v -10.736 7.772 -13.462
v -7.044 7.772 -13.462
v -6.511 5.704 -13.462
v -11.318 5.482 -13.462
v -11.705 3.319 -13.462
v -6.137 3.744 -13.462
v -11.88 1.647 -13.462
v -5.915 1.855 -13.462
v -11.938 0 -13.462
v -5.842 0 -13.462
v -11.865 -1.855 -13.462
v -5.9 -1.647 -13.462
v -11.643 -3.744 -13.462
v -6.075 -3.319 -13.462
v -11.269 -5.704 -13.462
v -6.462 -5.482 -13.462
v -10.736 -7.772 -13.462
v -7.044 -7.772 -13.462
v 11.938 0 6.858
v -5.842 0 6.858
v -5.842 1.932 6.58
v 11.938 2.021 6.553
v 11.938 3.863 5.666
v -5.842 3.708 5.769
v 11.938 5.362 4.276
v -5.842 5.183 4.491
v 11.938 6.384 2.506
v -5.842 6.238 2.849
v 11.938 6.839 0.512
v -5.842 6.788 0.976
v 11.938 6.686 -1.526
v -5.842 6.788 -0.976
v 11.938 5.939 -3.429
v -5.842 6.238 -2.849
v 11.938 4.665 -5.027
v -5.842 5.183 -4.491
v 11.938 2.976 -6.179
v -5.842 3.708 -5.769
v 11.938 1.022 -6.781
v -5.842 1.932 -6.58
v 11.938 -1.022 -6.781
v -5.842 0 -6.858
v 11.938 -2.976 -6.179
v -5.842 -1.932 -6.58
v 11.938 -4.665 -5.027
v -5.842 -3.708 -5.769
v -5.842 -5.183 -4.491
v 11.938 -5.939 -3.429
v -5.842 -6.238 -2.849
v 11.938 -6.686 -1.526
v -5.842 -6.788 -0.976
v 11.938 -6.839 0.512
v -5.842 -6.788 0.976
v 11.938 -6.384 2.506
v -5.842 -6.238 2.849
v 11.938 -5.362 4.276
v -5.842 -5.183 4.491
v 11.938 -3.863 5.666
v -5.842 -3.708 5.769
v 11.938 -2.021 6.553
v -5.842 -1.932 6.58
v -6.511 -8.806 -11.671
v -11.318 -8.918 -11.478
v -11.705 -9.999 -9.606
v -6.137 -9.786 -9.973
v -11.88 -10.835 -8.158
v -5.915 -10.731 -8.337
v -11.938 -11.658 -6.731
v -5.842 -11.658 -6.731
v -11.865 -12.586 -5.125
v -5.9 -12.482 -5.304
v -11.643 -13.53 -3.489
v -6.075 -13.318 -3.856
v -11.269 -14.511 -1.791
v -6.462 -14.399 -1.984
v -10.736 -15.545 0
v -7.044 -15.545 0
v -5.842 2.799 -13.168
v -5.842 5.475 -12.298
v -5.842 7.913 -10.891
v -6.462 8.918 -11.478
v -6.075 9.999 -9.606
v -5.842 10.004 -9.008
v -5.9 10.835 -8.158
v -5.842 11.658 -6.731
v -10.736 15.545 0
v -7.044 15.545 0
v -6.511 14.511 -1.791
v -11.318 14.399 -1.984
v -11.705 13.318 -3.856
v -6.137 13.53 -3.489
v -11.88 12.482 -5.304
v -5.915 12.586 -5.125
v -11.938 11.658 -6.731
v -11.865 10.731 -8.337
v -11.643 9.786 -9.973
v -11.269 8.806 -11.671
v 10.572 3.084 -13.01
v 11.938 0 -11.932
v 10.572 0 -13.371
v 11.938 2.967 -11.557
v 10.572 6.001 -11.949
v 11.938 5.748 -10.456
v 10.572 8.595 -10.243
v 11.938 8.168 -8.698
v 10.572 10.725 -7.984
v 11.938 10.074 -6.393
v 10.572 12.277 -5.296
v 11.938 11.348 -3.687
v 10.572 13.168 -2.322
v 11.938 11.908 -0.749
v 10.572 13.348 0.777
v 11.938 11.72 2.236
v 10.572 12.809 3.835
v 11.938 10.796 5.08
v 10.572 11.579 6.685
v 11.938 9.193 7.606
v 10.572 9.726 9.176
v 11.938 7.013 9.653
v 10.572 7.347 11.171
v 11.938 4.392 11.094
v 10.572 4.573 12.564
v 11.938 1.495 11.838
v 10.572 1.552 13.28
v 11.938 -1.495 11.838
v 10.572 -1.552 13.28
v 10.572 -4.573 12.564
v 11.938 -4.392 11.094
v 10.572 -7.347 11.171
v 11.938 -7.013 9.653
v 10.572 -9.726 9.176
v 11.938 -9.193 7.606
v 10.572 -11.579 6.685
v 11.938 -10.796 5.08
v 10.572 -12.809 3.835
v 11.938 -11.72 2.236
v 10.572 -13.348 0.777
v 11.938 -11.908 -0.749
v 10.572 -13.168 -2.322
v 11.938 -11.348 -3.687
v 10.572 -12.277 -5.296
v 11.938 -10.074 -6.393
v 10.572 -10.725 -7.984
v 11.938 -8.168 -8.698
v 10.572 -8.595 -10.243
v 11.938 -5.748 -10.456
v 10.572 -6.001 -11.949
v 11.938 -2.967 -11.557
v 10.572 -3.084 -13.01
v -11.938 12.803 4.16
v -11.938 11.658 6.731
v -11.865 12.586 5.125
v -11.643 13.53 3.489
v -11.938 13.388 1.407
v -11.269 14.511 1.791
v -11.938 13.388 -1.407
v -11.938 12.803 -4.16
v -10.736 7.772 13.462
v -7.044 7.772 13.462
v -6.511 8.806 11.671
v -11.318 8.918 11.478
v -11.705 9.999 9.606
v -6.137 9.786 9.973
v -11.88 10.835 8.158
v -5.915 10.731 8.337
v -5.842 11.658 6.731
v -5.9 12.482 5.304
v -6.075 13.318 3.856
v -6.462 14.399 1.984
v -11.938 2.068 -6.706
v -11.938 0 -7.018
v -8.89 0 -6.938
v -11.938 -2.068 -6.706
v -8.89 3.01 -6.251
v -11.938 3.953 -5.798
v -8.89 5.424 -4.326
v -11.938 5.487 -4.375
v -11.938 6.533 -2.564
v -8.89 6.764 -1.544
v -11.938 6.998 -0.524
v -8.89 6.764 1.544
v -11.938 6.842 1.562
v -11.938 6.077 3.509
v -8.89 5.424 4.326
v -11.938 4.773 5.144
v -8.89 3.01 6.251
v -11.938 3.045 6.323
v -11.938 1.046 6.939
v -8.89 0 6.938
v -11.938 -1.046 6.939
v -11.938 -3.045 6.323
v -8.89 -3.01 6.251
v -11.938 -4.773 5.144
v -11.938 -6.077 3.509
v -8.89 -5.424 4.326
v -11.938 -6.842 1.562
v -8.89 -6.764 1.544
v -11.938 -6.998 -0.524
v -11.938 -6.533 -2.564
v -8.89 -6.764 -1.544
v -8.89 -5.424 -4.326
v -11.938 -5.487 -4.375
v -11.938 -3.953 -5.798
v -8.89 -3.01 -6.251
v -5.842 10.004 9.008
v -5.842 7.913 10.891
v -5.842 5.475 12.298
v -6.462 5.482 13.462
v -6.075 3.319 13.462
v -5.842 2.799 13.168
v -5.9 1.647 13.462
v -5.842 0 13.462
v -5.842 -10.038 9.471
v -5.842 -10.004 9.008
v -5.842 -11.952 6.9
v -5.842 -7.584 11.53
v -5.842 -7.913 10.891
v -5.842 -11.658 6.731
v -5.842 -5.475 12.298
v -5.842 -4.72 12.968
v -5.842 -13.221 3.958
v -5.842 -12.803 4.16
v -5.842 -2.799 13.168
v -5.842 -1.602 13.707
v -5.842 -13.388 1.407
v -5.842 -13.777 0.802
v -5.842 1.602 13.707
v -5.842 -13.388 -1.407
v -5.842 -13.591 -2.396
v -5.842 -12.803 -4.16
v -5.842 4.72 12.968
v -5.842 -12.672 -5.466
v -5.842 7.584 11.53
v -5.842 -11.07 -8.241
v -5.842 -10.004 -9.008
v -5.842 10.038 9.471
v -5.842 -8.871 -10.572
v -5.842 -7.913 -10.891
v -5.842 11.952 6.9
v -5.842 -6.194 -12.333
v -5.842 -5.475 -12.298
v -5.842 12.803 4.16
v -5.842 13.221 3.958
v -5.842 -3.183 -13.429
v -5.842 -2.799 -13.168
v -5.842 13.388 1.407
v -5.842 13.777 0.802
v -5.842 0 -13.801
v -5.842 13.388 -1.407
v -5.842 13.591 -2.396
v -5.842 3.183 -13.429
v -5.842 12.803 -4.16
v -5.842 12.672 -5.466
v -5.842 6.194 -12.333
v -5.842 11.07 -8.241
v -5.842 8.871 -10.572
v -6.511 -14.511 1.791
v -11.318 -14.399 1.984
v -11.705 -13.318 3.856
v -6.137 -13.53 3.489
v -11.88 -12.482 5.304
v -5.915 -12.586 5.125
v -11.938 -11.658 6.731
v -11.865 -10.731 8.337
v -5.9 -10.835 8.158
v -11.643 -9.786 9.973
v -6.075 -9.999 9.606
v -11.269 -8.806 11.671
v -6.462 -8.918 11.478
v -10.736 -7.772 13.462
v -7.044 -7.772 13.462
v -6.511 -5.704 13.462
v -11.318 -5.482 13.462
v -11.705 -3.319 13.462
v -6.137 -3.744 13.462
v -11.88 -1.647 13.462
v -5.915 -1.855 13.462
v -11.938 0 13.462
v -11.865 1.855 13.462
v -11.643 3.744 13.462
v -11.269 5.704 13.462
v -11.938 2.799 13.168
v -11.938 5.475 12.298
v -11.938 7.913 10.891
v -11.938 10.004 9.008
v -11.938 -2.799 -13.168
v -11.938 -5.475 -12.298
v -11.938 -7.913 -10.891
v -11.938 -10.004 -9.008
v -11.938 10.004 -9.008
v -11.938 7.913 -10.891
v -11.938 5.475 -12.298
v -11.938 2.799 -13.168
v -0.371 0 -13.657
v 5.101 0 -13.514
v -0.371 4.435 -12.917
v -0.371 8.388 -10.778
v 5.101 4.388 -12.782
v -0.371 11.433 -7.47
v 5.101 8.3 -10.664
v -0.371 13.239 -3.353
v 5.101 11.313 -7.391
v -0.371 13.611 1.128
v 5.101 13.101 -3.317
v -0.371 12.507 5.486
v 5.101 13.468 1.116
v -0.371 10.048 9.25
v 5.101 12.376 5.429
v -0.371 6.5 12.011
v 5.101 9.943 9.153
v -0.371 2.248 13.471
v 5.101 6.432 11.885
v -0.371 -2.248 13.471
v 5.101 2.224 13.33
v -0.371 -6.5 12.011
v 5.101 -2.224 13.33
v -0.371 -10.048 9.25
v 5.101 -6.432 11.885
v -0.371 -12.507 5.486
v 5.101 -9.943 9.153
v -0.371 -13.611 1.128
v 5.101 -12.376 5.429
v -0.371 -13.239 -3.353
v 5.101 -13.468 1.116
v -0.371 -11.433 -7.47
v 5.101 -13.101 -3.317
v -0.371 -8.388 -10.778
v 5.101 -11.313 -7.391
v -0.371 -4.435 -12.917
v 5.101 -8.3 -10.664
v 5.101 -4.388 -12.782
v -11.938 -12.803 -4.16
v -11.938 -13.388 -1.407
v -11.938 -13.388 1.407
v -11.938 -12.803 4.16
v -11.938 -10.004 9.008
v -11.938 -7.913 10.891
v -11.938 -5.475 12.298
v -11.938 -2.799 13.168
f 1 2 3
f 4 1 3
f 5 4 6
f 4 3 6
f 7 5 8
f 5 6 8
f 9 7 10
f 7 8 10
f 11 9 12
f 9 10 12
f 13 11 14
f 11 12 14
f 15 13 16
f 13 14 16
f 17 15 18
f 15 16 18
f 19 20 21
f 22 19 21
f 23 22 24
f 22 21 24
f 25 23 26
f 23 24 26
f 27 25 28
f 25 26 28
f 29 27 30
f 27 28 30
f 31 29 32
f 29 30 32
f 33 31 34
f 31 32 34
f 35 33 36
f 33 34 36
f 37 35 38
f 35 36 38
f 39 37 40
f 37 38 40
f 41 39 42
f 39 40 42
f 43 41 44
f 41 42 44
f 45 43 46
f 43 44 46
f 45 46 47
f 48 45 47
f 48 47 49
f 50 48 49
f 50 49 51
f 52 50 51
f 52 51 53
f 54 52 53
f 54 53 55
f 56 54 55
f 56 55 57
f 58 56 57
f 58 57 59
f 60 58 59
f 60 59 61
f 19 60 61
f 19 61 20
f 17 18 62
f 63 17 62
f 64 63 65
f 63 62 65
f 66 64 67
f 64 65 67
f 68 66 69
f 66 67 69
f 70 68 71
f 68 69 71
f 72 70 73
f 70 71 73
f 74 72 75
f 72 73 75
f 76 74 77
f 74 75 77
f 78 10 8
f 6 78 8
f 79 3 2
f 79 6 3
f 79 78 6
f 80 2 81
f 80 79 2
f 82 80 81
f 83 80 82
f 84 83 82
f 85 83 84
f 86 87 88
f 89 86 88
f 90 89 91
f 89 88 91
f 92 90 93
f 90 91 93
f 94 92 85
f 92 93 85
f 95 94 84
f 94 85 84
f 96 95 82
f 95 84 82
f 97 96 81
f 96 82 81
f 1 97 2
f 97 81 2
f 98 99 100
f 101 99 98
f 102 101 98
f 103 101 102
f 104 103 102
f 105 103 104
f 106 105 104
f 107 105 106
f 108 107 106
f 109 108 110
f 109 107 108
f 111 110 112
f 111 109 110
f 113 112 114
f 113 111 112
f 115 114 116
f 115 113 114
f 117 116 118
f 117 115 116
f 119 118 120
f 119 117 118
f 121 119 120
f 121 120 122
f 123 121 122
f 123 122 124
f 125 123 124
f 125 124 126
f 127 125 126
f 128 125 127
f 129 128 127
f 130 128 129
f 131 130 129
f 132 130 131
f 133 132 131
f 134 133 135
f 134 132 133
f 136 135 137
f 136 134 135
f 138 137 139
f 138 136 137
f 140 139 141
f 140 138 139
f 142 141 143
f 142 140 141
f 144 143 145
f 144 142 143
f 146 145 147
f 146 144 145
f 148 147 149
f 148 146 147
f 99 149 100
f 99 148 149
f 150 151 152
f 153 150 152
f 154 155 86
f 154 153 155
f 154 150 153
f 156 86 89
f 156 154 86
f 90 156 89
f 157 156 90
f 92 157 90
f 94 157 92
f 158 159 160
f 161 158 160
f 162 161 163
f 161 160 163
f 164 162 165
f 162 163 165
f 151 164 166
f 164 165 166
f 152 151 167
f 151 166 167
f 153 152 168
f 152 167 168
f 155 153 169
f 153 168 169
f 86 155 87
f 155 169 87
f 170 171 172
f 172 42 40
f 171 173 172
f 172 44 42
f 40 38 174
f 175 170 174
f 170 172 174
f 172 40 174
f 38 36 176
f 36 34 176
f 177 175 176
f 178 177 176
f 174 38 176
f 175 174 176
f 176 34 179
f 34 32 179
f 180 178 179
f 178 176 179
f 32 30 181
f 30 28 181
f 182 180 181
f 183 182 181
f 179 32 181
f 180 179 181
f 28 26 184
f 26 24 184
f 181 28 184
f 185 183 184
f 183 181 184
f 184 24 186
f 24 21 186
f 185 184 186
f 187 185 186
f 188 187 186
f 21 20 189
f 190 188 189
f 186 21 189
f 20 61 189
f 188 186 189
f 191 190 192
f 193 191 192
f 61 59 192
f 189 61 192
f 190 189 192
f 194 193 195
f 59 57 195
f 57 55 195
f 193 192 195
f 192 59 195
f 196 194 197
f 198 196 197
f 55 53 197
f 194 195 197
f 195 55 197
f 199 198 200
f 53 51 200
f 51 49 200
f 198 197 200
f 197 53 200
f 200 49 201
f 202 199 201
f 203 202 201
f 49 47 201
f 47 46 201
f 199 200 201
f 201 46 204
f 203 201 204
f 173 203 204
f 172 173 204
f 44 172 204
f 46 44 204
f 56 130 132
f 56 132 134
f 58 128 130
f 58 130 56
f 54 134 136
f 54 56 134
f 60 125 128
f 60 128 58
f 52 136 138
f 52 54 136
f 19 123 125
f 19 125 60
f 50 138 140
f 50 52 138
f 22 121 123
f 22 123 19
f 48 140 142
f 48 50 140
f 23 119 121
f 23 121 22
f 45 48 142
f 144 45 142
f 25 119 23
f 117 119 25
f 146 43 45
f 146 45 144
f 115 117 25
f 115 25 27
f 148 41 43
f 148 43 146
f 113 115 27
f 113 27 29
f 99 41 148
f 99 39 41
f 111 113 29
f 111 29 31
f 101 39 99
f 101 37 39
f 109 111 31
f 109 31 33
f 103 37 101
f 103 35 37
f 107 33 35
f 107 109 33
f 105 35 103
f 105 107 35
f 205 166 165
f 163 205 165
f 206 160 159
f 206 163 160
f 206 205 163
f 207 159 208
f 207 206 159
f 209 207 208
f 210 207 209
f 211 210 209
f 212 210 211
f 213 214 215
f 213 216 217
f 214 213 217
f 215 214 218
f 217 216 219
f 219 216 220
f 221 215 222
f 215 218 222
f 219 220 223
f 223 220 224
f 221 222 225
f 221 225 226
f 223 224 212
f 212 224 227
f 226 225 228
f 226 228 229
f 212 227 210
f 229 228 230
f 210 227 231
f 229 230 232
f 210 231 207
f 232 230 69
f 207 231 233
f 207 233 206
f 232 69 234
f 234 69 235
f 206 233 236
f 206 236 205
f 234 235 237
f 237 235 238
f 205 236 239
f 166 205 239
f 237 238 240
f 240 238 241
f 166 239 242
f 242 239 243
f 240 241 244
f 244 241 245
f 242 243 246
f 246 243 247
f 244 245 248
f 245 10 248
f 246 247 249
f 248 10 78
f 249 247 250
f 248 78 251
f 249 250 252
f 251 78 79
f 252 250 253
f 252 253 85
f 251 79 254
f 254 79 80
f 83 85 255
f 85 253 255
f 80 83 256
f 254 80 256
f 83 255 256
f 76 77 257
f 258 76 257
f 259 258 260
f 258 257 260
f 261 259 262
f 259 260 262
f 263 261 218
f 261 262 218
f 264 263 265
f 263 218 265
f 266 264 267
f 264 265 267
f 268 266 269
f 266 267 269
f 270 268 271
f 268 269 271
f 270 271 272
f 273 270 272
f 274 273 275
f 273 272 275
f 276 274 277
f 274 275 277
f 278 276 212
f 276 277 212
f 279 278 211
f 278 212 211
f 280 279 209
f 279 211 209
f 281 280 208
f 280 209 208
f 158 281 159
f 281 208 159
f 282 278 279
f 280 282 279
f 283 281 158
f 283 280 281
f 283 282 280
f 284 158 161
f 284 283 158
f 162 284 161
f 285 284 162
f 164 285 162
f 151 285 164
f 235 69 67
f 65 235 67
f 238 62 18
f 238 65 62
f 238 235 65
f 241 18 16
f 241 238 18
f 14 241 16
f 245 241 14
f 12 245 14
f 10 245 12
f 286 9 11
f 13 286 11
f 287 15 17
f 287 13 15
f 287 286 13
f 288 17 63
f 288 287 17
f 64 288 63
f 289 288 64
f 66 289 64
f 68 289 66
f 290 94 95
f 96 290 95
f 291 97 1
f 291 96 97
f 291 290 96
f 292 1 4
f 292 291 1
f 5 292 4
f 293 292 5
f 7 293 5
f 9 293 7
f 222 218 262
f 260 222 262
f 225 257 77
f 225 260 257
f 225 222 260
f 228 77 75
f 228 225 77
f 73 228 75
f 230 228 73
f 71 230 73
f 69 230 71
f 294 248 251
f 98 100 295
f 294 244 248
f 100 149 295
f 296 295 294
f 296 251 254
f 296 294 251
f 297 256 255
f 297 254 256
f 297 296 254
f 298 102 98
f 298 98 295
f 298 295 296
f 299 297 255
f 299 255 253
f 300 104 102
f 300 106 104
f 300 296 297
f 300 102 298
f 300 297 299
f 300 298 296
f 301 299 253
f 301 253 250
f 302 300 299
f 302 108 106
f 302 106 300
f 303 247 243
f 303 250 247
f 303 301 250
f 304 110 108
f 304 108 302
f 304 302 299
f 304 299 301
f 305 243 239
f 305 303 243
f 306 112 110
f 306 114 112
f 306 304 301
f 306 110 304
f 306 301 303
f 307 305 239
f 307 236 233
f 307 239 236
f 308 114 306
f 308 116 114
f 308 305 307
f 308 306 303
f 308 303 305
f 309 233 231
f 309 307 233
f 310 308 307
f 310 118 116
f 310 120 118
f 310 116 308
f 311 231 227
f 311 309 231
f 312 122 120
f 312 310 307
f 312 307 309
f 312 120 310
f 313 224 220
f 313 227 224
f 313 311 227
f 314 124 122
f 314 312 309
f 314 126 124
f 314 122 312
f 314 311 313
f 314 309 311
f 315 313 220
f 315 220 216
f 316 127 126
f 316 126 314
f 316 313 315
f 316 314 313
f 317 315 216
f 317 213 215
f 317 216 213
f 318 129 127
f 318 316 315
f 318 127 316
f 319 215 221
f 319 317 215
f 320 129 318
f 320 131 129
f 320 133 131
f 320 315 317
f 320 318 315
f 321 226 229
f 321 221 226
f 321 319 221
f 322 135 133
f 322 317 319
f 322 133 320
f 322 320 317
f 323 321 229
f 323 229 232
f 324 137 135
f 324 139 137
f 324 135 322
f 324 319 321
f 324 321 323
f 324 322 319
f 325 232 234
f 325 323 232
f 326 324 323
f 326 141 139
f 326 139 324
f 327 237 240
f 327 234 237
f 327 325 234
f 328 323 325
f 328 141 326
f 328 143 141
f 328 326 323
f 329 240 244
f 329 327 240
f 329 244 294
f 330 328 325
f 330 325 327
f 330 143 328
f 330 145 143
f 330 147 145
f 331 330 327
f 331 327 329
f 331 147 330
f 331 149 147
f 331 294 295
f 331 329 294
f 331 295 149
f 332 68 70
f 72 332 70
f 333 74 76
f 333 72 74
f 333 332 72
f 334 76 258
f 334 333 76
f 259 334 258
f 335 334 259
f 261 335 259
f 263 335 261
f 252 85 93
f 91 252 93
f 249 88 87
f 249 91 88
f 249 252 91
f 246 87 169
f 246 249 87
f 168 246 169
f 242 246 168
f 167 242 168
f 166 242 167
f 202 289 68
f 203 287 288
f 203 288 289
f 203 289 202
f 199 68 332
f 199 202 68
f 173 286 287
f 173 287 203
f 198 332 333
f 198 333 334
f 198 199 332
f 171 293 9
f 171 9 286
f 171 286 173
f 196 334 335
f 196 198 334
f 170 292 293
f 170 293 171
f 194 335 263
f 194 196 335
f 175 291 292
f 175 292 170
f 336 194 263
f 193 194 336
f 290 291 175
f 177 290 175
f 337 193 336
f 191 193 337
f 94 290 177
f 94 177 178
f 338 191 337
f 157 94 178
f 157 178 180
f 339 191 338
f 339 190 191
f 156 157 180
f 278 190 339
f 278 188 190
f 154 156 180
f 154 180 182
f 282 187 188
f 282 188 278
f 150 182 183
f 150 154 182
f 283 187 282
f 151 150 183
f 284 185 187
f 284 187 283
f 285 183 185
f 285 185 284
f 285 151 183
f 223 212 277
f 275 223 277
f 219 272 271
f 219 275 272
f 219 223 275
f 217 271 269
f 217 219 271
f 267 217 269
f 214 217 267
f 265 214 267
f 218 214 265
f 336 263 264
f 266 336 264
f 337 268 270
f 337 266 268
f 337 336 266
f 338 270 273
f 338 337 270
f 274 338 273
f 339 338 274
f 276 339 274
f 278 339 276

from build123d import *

# Parameters (mm, degrees)
SKETCH2_R          = 13.335
EXTRUDE1_DEPTH     = 17.78
EXTRUDE1_DRAFT     = 1.5
CHAMFER1_SIZE      = 1.366157143
CHAMFER1_SIZE2     = 1.403374095
EXTRUDE2_DEPTH     = 6.096
SKETCH6_R          = 6.858
CUT_EXTRUDE1_DEPTH = 28.353582774
CUT_EXTRUDE1_DRAFT = 1.5
SKETCH12_OUTSIDE_W = 152.316
SKETCH12_OUTSIDE_H = 155.804
SKETCH12_OUTSIDE_R = 13.462
CUT_EXTRUDE6_DEPTH = 32.656807587
CUT_EXTRUDE6_DRAFT = -60
SKETCH13_OUTSIDE_W = 137.41
SKETCH13_OUTSIDE_H = 140.898
SKETCH13_OUTSIDE_R = 13.462
CUT_EXTRUDE7_DEPTH = 28.353582774
CUT_EXTRUDE7_DRAFT = -60
SKETCH15_R         = 6.858
CUT_EXTRUDE8_DEPTH = 28.353582774


with BuildPart() as part:
    # Sketch2 → Extrude1 (with draft: the straight prism first)
    with BuildSketch(Plane(origin=(11.938, 0, 0), x_dir=(0, 0, -1), z_dir=(1, 0, 0))):
        Circle(SKETCH2_R)
    extrude(amount=-EXTRUDE1_DEPTH)
    # Extrude1: the draft: its side faces are tilted about the plane it starts from
    extrude1_sides = [part.faces().sort_by_distance(p)[0] for p in [
        (3.048, 0, 13.335),
    ]]
    draft(extrude1_sides, Plane(origin=(11.938, 0, 0), x_dir=(0, 0, -1), z_dir=(1, 0, 0)), EXTRUDE1_DRAFT)

    # Chamfer1
    chamfer1_edges = [part.edges().sort_by_distance(p)[0] for p in [
        (11.938, 0, 13.335),
    ]]
    chamfer1_side = [part.faces().sort_by_distance(p)[0] for p in [
        (3.048, 0, 13.567792843),
    ]]
    chamfer(chamfer1_edges, length=CHAMFER1_SIZE, length2=CHAMFER1_SIZE2, reference=chamfer1_side[0])

    # Sketch5 → Extrude2 (add)
    with BuildSketch(Plane.ZY.offset(5.842)):
        Polygon((0, 15.544578648), (-13.462, 7.772289324), (-13.462, -7.772289324), (0, -15.544578648), (13.462, -7.772289324), (13.462, 7.772289324), align=None)
    extrude(amount=EXTRUDE2_DEPTH)


with BuildPart() as cut_extrude1_tool:
    # Sketch6 → Cut-Extrude1 (with draft: the straight prism first)
    with BuildSketch(Plane(origin=(-5.842, 0, 0), x_dir=(0, 0, -1), z_dir=(1, 0, 0))):
        Circle(SKETCH6_R)
    extrude(amount=-CUT_EXTRUDE1_DEPTH)
    # Cut-Extrude1: the draft: its side faces are tilted about the plane it starts from
    cut_extrude1_sides = [cut_extrude1_tool.faces().sort_by_distance(p)[0] for p in [
        (-20.018791387, 0, 6.858),
    ]]
    draft(cut_extrude1_sides, Plane(origin=(-5.842, 0, 0), x_dir=(0, 0, -1), z_dir=(1, 0, 0)), CUT_EXTRUDE1_DRAFT)


with BuildPart() as part_1:
    add(part.part)

    # Cut-Extrude1: cut by cut_extrude1_tool
    add(cut_extrude1_tool.part, mode=Mode.SUBTRACT)

    # Cut-Extrude4 cone 1 section (through the dimple's axis) → Cut-Extrude4 (revolve, cut)
    with BuildSketch(Plane(origin=(-11.938, 0, 0), x_dir=(0, 0, 1), z_dir=(0, 1, 0))):
        Polygon((0, 0), (7.017629378, 0), (0, 7.017629378), align=None)
    revolve(axis=Axis((-11.938, 0, 0), (1, 0, 0)), mode=Mode.SUBTRACT)


with BuildPart() as cut_extrude6_tool:
    # Sketch12 outside → Cut-Extrude6 (with draft: the straight prism first)
    with BuildSketch(Plane.ZY.offset(11.938)):
        Rectangle(SKETCH12_OUTSIDE_W, SKETCH12_OUTSIDE_H)
        Circle(SKETCH12_OUTSIDE_R, mode=Mode.SUBTRACT)
    extrude(amount=-CUT_EXTRUDE6_DEPTH)
    # Cut-Extrude6: the draft: its side faces are tilted about the plane it starts from
    cut_extrude6_sides = [cut_extrude6_tool.faces().sort_by_distance(p)[0] for p in [
        (4.390403793, -77.902, 0),
        (4.390403793, 0, 76.158),
        (4.390403793, 77.902, 0),
        (4.390403793, 0, -76.158),
        (4.390403793, 0, -13.462),
    ]]
    draft(cut_extrude6_sides, Plane.ZY.offset(11.938), CUT_EXTRUDE6_DRAFT)


with BuildPart() as part_2:
    add(part_1.part)

    # Cut-Extrude6: cut by cut_extrude6_tool
    add(cut_extrude6_tool.part, mode=Mode.SUBTRACT)


with BuildPart() as cut_extrude7_tool:
    # Sketch13 outside → Cut-Extrude7 (with draft: the straight prism first)
    with BuildSketch(Plane(origin=(-5.842, 0, 0), x_dir=(0, 0, -1), z_dir=(1, 0, 0))):
        Rectangle(SKETCH13_OUTSIDE_W, SKETCH13_OUTSIDE_H)
        Circle(SKETCH13_OUTSIDE_R, mode=Mode.SUBTRACT)
    extrude(amount=-CUT_EXTRUDE7_DEPTH)
    # Cut-Extrude7: the draft: its side faces are tilted about the plane it starts from
    cut_extrude7_sides = [cut_extrude7_tool.faces().sort_by_distance(p)[0] for p in [
        (-20.018791387, -70.449, 0),
        (-20.018791387, 0, -68.705),
        (-20.018791387, 70.449, 0),
        (-20.018791387, 0, 68.705),
        (-20.018791387, 0, 13.462),
    ]]
    draft(cut_extrude7_sides, Plane(origin=(-5.842, 0, 0), x_dir=(0, 0, -1), z_dir=(1, 0, 0)), CUT_EXTRUDE7_DRAFT)


with BuildPart() as part_3:
    add(part_2.part)

    # Cut-Extrude7: cut by cut_extrude7_tool
    add(cut_extrude7_tool.part, mode=Mode.SUBTRACT)

    # Sketch15 → Cut-Extrude8 (cut, through all)
    with BuildSketch(Plane.ZY.offset(5.842)):
        Circle(SKETCH15_R)
    extrude(amount=-CUT_EXTRUDE8_DEPTH, mode=Mode.SUBTRACT)


solid = part_3.part
